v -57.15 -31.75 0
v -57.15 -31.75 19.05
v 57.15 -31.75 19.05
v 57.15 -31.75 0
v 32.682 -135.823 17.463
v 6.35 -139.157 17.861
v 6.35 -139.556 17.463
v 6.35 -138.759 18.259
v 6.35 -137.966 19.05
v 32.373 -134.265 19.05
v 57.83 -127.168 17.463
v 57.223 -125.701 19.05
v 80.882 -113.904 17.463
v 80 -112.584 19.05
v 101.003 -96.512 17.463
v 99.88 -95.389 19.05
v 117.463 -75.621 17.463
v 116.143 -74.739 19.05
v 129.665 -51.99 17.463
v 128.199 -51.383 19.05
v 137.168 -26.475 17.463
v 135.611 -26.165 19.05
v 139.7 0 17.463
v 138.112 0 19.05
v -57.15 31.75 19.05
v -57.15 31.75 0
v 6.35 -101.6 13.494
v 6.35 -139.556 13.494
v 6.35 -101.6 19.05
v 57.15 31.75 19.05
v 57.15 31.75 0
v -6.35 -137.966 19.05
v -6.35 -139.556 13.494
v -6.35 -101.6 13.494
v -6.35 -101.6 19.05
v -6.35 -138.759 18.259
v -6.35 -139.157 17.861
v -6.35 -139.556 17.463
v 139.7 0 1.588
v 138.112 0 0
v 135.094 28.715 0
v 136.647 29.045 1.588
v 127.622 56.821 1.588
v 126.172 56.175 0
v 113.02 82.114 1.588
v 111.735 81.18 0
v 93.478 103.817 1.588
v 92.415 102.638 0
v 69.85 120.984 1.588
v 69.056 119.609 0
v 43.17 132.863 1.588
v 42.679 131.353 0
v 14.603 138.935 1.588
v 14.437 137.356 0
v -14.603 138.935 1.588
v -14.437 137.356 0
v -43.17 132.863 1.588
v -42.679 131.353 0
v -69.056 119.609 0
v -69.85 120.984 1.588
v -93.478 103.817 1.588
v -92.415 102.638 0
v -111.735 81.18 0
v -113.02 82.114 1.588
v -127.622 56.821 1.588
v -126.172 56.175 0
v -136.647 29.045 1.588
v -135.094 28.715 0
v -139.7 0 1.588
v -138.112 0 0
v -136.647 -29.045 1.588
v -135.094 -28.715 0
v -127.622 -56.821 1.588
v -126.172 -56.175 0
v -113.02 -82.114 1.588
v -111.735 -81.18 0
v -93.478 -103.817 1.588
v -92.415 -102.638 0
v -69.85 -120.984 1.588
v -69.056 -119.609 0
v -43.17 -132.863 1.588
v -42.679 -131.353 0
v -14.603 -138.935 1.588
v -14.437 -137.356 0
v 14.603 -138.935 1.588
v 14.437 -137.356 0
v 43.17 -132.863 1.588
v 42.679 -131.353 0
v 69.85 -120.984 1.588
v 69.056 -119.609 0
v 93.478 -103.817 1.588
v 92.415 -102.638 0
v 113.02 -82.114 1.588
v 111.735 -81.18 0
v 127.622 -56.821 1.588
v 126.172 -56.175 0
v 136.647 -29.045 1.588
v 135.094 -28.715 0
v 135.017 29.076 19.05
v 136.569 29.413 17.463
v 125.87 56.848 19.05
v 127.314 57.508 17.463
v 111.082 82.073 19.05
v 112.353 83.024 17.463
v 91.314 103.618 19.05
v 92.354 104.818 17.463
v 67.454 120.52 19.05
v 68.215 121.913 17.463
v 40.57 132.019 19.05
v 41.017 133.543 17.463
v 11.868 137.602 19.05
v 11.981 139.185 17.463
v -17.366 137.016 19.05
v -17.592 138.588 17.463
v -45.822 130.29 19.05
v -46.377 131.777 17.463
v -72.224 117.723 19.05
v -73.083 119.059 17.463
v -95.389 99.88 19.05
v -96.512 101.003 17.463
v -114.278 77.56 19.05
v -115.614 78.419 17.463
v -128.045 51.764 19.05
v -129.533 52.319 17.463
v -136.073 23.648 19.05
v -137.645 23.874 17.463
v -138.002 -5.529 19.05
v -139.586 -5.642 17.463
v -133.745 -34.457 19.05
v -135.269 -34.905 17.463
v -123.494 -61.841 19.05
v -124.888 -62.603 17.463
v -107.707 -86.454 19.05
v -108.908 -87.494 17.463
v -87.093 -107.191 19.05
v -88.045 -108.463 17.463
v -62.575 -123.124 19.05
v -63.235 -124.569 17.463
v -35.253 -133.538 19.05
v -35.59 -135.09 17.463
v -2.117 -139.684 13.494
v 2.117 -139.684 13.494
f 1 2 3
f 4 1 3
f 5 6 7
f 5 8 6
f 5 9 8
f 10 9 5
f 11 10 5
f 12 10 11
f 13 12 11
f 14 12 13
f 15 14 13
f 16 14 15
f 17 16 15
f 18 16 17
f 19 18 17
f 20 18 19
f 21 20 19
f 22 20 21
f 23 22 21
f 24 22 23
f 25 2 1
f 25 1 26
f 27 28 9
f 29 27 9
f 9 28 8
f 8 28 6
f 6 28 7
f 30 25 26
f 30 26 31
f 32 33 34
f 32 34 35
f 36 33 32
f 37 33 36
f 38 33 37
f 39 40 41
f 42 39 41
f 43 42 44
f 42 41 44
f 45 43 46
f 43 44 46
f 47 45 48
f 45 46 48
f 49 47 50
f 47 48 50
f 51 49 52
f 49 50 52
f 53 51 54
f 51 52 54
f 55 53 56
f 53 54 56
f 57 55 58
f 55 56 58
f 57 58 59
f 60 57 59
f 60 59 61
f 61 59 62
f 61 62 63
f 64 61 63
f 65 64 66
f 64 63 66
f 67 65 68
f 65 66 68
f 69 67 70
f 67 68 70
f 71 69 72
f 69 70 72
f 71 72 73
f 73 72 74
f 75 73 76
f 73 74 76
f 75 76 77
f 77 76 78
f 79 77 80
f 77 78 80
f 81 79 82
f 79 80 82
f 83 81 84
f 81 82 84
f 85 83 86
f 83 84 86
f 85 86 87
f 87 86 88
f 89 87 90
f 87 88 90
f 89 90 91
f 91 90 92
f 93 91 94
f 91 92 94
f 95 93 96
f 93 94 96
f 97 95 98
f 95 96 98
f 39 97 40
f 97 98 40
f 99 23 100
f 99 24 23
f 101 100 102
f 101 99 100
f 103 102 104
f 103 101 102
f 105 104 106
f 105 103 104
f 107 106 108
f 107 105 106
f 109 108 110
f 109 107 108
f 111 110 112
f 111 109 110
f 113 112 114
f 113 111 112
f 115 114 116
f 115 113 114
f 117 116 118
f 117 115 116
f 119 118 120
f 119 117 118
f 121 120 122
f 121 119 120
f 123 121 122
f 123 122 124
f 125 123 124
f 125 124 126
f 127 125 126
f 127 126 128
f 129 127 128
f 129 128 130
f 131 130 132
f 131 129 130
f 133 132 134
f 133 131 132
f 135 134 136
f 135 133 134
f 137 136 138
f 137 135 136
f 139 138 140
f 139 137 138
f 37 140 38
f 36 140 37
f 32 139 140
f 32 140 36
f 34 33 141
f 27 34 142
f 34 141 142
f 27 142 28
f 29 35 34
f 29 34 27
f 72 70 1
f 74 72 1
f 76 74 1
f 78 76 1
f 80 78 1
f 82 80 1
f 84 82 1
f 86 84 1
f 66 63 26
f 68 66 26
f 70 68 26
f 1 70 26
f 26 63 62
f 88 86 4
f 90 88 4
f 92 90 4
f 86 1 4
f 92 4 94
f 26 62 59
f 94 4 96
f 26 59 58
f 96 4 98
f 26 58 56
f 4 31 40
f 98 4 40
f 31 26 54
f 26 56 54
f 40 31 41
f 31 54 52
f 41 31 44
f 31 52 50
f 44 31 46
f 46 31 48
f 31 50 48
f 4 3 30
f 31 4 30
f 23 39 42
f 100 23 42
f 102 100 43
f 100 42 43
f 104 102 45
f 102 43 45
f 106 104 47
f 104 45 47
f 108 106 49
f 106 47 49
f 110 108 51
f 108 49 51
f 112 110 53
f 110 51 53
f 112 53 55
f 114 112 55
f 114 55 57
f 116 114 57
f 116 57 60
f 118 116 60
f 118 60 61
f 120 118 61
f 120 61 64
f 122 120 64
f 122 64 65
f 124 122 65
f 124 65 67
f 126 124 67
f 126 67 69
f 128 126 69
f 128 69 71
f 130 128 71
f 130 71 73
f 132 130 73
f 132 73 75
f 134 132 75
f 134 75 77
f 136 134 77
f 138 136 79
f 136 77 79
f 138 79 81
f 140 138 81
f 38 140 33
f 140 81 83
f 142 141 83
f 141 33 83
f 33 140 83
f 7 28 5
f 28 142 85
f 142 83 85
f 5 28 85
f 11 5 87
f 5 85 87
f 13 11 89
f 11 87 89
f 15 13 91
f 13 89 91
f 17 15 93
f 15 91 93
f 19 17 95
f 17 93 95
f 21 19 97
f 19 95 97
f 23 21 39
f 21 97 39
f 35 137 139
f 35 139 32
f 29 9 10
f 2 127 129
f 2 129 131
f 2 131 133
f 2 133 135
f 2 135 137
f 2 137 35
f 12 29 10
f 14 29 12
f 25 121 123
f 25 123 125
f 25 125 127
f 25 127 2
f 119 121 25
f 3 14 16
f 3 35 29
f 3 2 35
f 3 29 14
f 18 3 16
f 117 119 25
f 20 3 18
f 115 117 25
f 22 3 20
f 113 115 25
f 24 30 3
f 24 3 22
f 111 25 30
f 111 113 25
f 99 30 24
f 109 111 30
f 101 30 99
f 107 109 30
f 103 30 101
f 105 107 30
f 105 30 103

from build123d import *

# Parameters (mm, degrees)
F2_R     = 139.7
F2_R_2   = 2.9765625
F3_DEPTH = 19.05
F4_SIZE  = 1.5875
F6_W     = 12.7
F6_H     = 5.55625
F7_DEPTH = 38.1
F8_W     = 114.3
F8_H     = 63.5
F8_R     = 2.9765625
F9_DEPTH = 19.051


# Not quite as in the source:
# - a variable given as a bare number and used for a length is read in inches; the dataset says mm whatever the document's units were


with BuildPart() as f3:
    # F2 (on Top) → F3 (new body)
    with BuildSketch(Plane.XY):
        Circle(F2_R)
        Circle(F2_R_2, mode=Mode.SUBTRACT)
    extrude(amount=F3_DEPTH)

    # F4
    f4_edges = [f3.edges().sort_by_distance(p)[0] for p in [
        (-139.7, 0, 19.05),
        (-139.7, 0, 0),
    ]]
    chamfer(f4_edges, length=F4_SIZE)

    # F6 (on offset) → F7 (cut)
    with BuildSketch(Plane.XZ.offset(139.7)):
        with Locations((0, 16.271875)):
            Rectangle(F6_W, F6_H)
    extrude(amount=-F7_DEPTH, mode=Mode.SUBTRACT)

    # F8 (on face) → F9 (cut, through all)
    with BuildSketch(Plane.XY.offset(19.05)):
        Rectangle(F8_W, F8_H)
        Circle(F8_R, mode=Mode.SUBTRACT)
    extrude(amount=-F9_DEPTH, mode=Mode.SUBTRACT)


solid = f3.part
